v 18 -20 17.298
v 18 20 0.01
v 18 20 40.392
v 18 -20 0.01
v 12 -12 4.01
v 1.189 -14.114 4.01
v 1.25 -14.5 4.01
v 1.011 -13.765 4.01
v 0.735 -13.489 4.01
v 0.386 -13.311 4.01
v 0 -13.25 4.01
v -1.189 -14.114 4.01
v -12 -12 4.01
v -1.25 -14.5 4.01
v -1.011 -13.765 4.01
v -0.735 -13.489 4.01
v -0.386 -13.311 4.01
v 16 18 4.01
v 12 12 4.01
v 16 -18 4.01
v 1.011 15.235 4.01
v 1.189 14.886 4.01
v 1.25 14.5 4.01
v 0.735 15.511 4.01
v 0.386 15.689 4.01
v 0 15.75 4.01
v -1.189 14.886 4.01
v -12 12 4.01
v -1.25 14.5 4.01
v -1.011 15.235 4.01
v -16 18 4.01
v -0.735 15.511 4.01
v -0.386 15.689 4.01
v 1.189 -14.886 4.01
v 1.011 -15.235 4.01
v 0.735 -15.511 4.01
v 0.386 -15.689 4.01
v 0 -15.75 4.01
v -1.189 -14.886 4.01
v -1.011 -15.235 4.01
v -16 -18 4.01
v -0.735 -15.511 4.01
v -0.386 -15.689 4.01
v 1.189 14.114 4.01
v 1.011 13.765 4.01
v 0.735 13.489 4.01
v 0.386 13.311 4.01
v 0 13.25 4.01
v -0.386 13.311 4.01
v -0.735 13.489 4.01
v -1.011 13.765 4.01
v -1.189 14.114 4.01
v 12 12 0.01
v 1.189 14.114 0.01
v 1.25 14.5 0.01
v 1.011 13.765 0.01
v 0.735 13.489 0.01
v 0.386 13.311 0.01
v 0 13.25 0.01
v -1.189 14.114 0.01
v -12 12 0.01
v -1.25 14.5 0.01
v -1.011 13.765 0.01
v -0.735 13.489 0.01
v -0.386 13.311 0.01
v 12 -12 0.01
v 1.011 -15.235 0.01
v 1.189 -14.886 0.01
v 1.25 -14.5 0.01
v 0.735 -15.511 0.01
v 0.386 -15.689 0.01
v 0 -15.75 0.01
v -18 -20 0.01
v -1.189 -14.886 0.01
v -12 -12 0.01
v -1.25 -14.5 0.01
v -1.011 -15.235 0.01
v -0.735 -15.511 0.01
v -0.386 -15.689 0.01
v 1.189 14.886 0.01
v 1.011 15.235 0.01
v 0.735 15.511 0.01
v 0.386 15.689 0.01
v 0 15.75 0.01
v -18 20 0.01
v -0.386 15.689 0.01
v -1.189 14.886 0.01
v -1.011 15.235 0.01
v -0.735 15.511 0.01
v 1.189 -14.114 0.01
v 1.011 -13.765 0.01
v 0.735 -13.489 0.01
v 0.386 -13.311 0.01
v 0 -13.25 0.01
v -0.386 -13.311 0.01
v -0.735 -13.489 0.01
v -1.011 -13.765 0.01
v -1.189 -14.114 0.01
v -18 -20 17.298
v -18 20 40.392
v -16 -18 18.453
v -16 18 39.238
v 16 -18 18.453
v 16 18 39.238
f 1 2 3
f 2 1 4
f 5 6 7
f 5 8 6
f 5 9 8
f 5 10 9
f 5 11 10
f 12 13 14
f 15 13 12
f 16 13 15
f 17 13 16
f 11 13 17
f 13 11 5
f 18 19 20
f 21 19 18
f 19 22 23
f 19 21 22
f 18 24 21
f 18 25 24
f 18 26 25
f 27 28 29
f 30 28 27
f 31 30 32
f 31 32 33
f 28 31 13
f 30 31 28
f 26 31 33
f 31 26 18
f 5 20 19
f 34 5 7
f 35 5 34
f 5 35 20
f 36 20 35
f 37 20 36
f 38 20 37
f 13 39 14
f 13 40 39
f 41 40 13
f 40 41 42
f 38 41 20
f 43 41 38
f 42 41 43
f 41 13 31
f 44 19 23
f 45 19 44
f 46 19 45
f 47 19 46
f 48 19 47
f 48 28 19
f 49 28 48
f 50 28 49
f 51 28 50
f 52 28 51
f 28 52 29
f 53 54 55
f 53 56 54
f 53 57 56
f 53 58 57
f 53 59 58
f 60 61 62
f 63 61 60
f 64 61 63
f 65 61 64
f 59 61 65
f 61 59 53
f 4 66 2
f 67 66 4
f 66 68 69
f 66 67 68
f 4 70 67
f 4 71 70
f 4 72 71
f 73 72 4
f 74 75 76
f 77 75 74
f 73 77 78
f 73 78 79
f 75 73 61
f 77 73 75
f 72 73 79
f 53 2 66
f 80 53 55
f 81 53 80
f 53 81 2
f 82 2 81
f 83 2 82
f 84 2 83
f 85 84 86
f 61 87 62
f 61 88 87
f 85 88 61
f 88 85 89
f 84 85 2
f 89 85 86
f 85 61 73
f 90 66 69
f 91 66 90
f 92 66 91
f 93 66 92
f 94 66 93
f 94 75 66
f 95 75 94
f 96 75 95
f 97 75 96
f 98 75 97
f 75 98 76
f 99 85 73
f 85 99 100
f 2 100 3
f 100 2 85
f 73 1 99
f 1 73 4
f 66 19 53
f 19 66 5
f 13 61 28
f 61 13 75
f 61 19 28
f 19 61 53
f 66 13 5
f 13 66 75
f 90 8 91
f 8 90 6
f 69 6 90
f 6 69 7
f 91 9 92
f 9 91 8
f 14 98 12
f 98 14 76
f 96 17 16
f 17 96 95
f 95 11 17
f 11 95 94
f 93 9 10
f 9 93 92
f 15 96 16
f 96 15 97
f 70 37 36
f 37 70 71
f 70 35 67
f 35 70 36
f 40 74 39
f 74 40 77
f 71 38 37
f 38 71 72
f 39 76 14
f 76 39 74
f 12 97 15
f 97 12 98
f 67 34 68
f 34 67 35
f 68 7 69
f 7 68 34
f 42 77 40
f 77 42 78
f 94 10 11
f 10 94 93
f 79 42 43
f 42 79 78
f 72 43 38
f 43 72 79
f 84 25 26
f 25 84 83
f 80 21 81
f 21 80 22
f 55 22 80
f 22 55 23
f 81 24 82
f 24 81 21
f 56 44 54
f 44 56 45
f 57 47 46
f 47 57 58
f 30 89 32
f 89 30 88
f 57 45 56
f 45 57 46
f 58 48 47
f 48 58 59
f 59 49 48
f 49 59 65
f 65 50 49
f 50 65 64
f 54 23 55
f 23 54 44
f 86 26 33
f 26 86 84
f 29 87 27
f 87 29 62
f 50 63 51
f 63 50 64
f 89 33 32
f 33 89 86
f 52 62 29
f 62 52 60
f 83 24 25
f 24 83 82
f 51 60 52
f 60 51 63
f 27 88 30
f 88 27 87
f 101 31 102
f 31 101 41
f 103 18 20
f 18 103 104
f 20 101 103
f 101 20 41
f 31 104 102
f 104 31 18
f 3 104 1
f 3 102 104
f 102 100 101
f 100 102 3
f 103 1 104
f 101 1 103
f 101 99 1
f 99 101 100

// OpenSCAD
//rotate([0,45,0])
intersection(){
  translate([-18,-20])
    cube([36,40,50]);
  union(){
difference(){
  translate([-18,-20,0.01])
    cube([36,40,4]);
  translate([-12,-12]) cube([24,24,50]);
  translate([0,-14.5]) cylinder(d=2.5,h=50,$fn=20);
  translate([0,14.5]) cylinder(d=2.5,h=50,$fn=20);
}
difference(){union(){
  translate([-18,-20,4]) difference(){
    cube([2,40,40]);
    *translate([-.01,13,5]) {
      rotate([0,90,0]) cylinder(d=6,h=4.02,$fn=30);
      translate([0,8,0]) rotate([0,90]) cylinder(d=6,h=4.02,$fn=30);
    }
  }
  translate([16,-20,4]) cube([2,40,40]);
  translate([-18,-20,4]) cube([36,2,40]);
  translate([-18,18,4]) cube([36,2,40]);
  *translate([-21.99,2.01,29]) rotate([30,0]) translate([-20,-30,0]) cube(78);
  }
  translate([-22,2,30]) rotate([30,0]) translate([-20,-30,0]) cube(80);
}
}
}
